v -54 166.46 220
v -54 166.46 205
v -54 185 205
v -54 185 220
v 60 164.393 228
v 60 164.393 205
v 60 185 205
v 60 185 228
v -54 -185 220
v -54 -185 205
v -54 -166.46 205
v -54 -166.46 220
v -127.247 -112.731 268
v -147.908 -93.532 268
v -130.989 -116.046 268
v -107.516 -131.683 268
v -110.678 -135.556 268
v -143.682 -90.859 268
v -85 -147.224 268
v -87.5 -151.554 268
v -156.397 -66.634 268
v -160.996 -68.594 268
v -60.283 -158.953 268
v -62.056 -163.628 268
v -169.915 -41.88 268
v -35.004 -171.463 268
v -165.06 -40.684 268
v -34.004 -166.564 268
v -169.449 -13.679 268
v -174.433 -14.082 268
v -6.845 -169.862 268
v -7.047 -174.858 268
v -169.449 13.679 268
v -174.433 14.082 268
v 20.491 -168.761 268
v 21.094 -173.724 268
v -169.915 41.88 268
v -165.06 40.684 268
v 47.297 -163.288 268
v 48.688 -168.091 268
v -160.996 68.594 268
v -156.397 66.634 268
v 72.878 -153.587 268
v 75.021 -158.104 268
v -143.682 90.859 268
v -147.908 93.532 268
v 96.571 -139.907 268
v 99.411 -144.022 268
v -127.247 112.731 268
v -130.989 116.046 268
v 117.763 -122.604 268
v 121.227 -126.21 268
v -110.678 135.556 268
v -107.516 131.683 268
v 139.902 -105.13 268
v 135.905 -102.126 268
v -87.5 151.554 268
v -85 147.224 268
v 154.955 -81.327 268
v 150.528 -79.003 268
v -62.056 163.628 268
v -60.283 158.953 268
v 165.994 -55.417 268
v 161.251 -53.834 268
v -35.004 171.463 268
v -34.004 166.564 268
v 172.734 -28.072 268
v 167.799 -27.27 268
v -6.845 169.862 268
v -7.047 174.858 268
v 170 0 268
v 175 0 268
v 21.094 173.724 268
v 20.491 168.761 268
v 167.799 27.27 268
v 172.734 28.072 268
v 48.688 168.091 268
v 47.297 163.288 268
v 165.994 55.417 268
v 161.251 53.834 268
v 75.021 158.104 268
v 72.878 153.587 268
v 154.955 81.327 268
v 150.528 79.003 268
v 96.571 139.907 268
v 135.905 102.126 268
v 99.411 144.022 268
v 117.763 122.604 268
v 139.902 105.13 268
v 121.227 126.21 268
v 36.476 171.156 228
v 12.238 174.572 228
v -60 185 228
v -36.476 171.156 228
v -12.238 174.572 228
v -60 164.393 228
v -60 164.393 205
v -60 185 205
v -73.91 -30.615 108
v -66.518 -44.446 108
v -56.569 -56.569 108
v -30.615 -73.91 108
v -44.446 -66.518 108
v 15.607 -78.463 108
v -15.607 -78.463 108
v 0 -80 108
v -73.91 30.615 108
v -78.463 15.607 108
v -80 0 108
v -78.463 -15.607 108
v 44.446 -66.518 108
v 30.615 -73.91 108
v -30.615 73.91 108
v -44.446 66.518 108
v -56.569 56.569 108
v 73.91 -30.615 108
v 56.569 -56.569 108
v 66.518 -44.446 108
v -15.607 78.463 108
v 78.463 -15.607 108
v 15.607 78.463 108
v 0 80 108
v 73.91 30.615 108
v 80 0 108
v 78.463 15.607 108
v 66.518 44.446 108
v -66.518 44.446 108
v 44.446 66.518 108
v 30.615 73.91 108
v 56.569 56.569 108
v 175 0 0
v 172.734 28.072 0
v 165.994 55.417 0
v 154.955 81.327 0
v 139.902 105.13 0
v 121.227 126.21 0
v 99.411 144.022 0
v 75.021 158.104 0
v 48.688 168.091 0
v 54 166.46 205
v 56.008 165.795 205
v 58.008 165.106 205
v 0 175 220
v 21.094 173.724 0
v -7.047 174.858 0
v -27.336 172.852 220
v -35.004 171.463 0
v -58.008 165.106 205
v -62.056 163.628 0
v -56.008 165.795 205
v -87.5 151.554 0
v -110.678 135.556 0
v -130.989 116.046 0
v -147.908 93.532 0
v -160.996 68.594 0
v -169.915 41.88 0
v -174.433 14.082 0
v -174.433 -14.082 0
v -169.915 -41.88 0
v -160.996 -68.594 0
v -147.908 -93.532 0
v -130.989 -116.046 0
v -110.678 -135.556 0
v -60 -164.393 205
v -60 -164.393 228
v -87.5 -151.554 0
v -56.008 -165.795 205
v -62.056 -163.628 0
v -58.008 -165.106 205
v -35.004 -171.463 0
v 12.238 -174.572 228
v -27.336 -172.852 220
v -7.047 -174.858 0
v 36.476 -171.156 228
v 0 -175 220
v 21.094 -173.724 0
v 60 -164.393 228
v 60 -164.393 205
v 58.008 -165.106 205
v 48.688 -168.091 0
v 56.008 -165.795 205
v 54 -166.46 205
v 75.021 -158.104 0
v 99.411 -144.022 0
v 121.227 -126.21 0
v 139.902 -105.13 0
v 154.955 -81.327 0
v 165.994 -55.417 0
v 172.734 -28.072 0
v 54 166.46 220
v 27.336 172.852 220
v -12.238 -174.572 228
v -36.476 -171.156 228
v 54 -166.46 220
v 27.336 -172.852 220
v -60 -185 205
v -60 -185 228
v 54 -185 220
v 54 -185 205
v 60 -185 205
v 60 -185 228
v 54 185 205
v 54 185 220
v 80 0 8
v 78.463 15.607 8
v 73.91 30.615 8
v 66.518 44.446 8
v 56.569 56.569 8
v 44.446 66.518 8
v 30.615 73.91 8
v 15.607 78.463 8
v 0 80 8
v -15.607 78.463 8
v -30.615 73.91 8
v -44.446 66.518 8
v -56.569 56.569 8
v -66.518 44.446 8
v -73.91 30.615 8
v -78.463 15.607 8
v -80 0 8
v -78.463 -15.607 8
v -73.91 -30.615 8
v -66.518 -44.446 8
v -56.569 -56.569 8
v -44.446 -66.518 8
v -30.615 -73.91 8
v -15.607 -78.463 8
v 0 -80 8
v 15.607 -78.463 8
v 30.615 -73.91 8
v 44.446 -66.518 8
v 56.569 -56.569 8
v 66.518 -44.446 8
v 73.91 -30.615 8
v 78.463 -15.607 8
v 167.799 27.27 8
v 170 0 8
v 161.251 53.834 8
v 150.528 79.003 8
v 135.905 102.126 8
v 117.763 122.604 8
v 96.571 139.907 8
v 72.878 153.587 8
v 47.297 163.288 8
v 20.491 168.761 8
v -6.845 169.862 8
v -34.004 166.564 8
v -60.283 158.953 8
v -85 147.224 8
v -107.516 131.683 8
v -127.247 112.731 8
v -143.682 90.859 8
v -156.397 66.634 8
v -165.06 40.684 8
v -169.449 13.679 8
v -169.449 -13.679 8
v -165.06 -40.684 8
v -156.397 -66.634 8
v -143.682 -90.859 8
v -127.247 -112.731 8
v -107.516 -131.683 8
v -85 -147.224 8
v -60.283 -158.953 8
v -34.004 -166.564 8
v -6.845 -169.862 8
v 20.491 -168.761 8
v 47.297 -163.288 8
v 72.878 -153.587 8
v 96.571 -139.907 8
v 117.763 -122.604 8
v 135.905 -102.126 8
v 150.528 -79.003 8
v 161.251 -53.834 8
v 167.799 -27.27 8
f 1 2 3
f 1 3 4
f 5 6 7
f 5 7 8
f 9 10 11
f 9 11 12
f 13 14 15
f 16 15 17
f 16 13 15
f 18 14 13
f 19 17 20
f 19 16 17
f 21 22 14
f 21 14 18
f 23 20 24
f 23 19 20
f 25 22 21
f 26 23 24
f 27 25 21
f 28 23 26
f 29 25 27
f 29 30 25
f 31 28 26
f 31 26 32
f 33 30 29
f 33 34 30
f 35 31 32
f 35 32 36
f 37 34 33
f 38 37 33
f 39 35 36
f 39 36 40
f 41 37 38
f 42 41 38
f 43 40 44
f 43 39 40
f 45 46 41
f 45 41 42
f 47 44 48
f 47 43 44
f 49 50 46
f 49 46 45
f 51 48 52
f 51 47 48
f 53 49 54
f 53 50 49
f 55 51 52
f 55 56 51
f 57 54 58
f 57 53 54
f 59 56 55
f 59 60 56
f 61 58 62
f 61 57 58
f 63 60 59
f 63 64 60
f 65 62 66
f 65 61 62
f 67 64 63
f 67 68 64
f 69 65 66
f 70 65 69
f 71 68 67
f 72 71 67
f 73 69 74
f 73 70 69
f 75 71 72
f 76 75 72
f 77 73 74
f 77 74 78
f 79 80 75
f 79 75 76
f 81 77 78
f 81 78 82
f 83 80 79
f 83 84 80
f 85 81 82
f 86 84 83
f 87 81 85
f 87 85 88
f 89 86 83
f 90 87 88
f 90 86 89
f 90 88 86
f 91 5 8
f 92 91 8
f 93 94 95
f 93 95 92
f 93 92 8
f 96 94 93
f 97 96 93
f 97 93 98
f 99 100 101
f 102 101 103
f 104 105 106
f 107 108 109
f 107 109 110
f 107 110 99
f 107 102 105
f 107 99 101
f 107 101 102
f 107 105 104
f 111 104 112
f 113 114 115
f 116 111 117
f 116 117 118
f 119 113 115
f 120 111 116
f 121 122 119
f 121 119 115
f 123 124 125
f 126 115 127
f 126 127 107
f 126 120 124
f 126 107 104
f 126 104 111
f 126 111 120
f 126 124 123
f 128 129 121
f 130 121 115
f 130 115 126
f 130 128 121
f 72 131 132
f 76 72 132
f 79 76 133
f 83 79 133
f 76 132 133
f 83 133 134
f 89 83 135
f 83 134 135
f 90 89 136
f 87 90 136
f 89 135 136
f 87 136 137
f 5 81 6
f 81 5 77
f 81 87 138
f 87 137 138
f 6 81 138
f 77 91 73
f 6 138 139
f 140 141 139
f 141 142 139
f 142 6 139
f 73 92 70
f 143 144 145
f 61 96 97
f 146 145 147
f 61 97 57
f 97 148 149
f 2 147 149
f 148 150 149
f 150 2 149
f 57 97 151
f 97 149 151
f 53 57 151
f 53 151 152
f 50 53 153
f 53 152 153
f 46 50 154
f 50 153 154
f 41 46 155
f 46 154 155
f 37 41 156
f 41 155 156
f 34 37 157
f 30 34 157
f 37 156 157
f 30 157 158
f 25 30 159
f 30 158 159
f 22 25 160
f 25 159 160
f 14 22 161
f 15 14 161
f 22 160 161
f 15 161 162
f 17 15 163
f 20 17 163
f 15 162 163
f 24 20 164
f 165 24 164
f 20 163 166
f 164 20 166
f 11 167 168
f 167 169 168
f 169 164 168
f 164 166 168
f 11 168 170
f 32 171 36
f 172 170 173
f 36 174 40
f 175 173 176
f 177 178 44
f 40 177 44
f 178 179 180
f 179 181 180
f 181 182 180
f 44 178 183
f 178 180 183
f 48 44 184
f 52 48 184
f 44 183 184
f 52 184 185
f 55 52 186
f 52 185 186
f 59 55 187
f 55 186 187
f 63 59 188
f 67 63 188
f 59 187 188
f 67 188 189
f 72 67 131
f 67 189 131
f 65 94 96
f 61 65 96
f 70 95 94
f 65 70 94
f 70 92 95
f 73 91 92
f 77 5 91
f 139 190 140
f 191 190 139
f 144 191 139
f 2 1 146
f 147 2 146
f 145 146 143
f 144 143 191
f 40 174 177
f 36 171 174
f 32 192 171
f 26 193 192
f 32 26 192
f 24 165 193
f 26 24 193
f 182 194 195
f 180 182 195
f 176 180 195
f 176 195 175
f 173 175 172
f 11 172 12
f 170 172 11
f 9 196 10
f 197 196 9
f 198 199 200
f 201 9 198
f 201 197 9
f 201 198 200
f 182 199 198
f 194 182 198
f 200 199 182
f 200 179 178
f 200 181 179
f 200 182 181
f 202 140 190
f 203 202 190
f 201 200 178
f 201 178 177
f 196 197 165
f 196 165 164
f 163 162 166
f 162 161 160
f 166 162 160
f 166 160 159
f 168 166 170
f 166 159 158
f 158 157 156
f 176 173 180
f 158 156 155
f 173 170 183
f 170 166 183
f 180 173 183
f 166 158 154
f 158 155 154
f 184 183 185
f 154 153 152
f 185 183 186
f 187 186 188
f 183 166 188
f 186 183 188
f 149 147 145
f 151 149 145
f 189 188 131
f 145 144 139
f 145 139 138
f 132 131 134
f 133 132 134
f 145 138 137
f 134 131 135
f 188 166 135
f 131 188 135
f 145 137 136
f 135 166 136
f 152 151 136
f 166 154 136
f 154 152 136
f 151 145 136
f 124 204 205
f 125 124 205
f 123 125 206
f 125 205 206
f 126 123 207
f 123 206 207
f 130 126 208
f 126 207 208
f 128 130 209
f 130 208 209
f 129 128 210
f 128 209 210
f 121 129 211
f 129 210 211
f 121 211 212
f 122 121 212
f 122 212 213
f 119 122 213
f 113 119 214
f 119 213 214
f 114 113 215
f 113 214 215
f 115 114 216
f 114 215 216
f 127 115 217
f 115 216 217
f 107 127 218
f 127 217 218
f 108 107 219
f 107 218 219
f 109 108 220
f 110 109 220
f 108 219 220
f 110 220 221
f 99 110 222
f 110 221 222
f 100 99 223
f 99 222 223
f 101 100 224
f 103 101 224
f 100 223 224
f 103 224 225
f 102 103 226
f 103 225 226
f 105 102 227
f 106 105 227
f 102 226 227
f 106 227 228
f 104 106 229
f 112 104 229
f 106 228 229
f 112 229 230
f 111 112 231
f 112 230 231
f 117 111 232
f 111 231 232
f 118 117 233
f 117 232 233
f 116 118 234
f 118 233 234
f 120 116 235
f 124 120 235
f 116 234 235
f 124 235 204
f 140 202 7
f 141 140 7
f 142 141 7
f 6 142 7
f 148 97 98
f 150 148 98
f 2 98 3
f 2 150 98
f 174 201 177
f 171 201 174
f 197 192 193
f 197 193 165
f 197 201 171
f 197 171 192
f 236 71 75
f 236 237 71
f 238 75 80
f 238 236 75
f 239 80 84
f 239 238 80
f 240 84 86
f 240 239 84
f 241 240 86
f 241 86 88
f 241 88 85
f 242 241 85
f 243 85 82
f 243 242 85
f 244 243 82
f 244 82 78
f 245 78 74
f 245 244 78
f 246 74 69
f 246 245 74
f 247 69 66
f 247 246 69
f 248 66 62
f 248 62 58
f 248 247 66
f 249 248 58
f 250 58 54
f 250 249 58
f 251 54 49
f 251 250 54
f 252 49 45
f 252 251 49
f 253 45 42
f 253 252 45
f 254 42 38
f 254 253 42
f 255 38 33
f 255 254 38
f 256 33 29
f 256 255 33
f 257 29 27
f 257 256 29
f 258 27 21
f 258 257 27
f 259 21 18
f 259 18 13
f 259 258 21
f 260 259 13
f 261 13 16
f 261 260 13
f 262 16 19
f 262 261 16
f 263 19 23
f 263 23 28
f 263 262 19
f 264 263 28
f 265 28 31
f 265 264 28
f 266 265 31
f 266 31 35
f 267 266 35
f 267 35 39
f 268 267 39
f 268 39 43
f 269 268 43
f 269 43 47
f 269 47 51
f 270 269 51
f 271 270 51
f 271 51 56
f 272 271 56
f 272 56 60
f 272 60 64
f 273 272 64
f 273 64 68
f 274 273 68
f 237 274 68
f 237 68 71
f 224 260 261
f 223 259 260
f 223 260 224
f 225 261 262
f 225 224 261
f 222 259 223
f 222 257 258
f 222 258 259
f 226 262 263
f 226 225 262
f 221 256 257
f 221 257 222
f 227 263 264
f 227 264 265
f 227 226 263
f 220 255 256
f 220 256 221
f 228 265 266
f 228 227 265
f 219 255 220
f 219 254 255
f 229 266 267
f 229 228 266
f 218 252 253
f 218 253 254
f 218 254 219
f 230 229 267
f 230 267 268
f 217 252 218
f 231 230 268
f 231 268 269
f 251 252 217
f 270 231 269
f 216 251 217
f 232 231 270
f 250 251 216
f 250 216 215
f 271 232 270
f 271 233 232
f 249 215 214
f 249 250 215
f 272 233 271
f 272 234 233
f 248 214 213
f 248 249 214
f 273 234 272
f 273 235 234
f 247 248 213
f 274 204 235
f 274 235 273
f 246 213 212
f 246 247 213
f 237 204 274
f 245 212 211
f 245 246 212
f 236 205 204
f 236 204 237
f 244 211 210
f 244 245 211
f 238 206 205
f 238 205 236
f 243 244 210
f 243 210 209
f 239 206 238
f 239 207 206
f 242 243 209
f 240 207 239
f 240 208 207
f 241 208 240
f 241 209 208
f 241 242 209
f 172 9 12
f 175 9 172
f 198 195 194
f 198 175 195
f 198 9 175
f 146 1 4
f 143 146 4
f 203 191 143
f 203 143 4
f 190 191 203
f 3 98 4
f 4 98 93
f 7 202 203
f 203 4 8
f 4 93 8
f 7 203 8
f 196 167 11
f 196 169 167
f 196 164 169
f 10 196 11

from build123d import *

# Parameters (mm, degrees)
F0_R     = 175
F1_DEPTH = 8
F2_R     = 175
F2_R_2   = 170
F3_DEPTH = 260
F4_R     = 80
F5_DEPTH = 100
F6_W     = 6
F6_H     = 15
F7_DEPTH = 185
F8_R     = 170
F9_DEPTH = 100


with BuildPart() as f1:
    # F0 (on Top) → F1 (new body)
    with BuildSketch(Plane.XY):
        Circle(F0_R)
    extrude(amount=F1_DEPTH)

    # F2 (on face) → F3 (join)
    with BuildSketch(Plane.XY.offset(8)):
        Circle(F2_R)
        Circle(F2_R_2, mode=Mode.SUBTRACT)
    extrude(amount=F3_DEPTH)

    # F4 (on face) → F5 (join)
    with BuildSketch(Plane.XY.offset(8)):
        Circle(F4_R)
    extrude(amount=F5_DEPTH)

    # F6 (on Front) → F7 (join, symmetric)
    with BuildSketch(Plane.XZ):
        Polygon((-54, 220), (0, 220), (0, 228), (-60, 228), (-60, 220), align=None)
        Polygon((0, 228), (0, 220), (54, 220), (60, 220), (60, 228), align=None)
        with Locations((-57, 212.5)):
            Rectangle(F6_W, F6_H)
        with Locations((57, 212.5)):
            Rectangle(F6_W, F6_H)
    extrude(amount=F7_DEPTH, both=True)

    # F8 (on face) → F9 (cut)
    with BuildSketch(Plane.XY.offset(268)):
        Circle(F8_R)
    extrude(amount=-F9_DEPTH, mode=Mode.SUBTRACT)


solid = f1.part
